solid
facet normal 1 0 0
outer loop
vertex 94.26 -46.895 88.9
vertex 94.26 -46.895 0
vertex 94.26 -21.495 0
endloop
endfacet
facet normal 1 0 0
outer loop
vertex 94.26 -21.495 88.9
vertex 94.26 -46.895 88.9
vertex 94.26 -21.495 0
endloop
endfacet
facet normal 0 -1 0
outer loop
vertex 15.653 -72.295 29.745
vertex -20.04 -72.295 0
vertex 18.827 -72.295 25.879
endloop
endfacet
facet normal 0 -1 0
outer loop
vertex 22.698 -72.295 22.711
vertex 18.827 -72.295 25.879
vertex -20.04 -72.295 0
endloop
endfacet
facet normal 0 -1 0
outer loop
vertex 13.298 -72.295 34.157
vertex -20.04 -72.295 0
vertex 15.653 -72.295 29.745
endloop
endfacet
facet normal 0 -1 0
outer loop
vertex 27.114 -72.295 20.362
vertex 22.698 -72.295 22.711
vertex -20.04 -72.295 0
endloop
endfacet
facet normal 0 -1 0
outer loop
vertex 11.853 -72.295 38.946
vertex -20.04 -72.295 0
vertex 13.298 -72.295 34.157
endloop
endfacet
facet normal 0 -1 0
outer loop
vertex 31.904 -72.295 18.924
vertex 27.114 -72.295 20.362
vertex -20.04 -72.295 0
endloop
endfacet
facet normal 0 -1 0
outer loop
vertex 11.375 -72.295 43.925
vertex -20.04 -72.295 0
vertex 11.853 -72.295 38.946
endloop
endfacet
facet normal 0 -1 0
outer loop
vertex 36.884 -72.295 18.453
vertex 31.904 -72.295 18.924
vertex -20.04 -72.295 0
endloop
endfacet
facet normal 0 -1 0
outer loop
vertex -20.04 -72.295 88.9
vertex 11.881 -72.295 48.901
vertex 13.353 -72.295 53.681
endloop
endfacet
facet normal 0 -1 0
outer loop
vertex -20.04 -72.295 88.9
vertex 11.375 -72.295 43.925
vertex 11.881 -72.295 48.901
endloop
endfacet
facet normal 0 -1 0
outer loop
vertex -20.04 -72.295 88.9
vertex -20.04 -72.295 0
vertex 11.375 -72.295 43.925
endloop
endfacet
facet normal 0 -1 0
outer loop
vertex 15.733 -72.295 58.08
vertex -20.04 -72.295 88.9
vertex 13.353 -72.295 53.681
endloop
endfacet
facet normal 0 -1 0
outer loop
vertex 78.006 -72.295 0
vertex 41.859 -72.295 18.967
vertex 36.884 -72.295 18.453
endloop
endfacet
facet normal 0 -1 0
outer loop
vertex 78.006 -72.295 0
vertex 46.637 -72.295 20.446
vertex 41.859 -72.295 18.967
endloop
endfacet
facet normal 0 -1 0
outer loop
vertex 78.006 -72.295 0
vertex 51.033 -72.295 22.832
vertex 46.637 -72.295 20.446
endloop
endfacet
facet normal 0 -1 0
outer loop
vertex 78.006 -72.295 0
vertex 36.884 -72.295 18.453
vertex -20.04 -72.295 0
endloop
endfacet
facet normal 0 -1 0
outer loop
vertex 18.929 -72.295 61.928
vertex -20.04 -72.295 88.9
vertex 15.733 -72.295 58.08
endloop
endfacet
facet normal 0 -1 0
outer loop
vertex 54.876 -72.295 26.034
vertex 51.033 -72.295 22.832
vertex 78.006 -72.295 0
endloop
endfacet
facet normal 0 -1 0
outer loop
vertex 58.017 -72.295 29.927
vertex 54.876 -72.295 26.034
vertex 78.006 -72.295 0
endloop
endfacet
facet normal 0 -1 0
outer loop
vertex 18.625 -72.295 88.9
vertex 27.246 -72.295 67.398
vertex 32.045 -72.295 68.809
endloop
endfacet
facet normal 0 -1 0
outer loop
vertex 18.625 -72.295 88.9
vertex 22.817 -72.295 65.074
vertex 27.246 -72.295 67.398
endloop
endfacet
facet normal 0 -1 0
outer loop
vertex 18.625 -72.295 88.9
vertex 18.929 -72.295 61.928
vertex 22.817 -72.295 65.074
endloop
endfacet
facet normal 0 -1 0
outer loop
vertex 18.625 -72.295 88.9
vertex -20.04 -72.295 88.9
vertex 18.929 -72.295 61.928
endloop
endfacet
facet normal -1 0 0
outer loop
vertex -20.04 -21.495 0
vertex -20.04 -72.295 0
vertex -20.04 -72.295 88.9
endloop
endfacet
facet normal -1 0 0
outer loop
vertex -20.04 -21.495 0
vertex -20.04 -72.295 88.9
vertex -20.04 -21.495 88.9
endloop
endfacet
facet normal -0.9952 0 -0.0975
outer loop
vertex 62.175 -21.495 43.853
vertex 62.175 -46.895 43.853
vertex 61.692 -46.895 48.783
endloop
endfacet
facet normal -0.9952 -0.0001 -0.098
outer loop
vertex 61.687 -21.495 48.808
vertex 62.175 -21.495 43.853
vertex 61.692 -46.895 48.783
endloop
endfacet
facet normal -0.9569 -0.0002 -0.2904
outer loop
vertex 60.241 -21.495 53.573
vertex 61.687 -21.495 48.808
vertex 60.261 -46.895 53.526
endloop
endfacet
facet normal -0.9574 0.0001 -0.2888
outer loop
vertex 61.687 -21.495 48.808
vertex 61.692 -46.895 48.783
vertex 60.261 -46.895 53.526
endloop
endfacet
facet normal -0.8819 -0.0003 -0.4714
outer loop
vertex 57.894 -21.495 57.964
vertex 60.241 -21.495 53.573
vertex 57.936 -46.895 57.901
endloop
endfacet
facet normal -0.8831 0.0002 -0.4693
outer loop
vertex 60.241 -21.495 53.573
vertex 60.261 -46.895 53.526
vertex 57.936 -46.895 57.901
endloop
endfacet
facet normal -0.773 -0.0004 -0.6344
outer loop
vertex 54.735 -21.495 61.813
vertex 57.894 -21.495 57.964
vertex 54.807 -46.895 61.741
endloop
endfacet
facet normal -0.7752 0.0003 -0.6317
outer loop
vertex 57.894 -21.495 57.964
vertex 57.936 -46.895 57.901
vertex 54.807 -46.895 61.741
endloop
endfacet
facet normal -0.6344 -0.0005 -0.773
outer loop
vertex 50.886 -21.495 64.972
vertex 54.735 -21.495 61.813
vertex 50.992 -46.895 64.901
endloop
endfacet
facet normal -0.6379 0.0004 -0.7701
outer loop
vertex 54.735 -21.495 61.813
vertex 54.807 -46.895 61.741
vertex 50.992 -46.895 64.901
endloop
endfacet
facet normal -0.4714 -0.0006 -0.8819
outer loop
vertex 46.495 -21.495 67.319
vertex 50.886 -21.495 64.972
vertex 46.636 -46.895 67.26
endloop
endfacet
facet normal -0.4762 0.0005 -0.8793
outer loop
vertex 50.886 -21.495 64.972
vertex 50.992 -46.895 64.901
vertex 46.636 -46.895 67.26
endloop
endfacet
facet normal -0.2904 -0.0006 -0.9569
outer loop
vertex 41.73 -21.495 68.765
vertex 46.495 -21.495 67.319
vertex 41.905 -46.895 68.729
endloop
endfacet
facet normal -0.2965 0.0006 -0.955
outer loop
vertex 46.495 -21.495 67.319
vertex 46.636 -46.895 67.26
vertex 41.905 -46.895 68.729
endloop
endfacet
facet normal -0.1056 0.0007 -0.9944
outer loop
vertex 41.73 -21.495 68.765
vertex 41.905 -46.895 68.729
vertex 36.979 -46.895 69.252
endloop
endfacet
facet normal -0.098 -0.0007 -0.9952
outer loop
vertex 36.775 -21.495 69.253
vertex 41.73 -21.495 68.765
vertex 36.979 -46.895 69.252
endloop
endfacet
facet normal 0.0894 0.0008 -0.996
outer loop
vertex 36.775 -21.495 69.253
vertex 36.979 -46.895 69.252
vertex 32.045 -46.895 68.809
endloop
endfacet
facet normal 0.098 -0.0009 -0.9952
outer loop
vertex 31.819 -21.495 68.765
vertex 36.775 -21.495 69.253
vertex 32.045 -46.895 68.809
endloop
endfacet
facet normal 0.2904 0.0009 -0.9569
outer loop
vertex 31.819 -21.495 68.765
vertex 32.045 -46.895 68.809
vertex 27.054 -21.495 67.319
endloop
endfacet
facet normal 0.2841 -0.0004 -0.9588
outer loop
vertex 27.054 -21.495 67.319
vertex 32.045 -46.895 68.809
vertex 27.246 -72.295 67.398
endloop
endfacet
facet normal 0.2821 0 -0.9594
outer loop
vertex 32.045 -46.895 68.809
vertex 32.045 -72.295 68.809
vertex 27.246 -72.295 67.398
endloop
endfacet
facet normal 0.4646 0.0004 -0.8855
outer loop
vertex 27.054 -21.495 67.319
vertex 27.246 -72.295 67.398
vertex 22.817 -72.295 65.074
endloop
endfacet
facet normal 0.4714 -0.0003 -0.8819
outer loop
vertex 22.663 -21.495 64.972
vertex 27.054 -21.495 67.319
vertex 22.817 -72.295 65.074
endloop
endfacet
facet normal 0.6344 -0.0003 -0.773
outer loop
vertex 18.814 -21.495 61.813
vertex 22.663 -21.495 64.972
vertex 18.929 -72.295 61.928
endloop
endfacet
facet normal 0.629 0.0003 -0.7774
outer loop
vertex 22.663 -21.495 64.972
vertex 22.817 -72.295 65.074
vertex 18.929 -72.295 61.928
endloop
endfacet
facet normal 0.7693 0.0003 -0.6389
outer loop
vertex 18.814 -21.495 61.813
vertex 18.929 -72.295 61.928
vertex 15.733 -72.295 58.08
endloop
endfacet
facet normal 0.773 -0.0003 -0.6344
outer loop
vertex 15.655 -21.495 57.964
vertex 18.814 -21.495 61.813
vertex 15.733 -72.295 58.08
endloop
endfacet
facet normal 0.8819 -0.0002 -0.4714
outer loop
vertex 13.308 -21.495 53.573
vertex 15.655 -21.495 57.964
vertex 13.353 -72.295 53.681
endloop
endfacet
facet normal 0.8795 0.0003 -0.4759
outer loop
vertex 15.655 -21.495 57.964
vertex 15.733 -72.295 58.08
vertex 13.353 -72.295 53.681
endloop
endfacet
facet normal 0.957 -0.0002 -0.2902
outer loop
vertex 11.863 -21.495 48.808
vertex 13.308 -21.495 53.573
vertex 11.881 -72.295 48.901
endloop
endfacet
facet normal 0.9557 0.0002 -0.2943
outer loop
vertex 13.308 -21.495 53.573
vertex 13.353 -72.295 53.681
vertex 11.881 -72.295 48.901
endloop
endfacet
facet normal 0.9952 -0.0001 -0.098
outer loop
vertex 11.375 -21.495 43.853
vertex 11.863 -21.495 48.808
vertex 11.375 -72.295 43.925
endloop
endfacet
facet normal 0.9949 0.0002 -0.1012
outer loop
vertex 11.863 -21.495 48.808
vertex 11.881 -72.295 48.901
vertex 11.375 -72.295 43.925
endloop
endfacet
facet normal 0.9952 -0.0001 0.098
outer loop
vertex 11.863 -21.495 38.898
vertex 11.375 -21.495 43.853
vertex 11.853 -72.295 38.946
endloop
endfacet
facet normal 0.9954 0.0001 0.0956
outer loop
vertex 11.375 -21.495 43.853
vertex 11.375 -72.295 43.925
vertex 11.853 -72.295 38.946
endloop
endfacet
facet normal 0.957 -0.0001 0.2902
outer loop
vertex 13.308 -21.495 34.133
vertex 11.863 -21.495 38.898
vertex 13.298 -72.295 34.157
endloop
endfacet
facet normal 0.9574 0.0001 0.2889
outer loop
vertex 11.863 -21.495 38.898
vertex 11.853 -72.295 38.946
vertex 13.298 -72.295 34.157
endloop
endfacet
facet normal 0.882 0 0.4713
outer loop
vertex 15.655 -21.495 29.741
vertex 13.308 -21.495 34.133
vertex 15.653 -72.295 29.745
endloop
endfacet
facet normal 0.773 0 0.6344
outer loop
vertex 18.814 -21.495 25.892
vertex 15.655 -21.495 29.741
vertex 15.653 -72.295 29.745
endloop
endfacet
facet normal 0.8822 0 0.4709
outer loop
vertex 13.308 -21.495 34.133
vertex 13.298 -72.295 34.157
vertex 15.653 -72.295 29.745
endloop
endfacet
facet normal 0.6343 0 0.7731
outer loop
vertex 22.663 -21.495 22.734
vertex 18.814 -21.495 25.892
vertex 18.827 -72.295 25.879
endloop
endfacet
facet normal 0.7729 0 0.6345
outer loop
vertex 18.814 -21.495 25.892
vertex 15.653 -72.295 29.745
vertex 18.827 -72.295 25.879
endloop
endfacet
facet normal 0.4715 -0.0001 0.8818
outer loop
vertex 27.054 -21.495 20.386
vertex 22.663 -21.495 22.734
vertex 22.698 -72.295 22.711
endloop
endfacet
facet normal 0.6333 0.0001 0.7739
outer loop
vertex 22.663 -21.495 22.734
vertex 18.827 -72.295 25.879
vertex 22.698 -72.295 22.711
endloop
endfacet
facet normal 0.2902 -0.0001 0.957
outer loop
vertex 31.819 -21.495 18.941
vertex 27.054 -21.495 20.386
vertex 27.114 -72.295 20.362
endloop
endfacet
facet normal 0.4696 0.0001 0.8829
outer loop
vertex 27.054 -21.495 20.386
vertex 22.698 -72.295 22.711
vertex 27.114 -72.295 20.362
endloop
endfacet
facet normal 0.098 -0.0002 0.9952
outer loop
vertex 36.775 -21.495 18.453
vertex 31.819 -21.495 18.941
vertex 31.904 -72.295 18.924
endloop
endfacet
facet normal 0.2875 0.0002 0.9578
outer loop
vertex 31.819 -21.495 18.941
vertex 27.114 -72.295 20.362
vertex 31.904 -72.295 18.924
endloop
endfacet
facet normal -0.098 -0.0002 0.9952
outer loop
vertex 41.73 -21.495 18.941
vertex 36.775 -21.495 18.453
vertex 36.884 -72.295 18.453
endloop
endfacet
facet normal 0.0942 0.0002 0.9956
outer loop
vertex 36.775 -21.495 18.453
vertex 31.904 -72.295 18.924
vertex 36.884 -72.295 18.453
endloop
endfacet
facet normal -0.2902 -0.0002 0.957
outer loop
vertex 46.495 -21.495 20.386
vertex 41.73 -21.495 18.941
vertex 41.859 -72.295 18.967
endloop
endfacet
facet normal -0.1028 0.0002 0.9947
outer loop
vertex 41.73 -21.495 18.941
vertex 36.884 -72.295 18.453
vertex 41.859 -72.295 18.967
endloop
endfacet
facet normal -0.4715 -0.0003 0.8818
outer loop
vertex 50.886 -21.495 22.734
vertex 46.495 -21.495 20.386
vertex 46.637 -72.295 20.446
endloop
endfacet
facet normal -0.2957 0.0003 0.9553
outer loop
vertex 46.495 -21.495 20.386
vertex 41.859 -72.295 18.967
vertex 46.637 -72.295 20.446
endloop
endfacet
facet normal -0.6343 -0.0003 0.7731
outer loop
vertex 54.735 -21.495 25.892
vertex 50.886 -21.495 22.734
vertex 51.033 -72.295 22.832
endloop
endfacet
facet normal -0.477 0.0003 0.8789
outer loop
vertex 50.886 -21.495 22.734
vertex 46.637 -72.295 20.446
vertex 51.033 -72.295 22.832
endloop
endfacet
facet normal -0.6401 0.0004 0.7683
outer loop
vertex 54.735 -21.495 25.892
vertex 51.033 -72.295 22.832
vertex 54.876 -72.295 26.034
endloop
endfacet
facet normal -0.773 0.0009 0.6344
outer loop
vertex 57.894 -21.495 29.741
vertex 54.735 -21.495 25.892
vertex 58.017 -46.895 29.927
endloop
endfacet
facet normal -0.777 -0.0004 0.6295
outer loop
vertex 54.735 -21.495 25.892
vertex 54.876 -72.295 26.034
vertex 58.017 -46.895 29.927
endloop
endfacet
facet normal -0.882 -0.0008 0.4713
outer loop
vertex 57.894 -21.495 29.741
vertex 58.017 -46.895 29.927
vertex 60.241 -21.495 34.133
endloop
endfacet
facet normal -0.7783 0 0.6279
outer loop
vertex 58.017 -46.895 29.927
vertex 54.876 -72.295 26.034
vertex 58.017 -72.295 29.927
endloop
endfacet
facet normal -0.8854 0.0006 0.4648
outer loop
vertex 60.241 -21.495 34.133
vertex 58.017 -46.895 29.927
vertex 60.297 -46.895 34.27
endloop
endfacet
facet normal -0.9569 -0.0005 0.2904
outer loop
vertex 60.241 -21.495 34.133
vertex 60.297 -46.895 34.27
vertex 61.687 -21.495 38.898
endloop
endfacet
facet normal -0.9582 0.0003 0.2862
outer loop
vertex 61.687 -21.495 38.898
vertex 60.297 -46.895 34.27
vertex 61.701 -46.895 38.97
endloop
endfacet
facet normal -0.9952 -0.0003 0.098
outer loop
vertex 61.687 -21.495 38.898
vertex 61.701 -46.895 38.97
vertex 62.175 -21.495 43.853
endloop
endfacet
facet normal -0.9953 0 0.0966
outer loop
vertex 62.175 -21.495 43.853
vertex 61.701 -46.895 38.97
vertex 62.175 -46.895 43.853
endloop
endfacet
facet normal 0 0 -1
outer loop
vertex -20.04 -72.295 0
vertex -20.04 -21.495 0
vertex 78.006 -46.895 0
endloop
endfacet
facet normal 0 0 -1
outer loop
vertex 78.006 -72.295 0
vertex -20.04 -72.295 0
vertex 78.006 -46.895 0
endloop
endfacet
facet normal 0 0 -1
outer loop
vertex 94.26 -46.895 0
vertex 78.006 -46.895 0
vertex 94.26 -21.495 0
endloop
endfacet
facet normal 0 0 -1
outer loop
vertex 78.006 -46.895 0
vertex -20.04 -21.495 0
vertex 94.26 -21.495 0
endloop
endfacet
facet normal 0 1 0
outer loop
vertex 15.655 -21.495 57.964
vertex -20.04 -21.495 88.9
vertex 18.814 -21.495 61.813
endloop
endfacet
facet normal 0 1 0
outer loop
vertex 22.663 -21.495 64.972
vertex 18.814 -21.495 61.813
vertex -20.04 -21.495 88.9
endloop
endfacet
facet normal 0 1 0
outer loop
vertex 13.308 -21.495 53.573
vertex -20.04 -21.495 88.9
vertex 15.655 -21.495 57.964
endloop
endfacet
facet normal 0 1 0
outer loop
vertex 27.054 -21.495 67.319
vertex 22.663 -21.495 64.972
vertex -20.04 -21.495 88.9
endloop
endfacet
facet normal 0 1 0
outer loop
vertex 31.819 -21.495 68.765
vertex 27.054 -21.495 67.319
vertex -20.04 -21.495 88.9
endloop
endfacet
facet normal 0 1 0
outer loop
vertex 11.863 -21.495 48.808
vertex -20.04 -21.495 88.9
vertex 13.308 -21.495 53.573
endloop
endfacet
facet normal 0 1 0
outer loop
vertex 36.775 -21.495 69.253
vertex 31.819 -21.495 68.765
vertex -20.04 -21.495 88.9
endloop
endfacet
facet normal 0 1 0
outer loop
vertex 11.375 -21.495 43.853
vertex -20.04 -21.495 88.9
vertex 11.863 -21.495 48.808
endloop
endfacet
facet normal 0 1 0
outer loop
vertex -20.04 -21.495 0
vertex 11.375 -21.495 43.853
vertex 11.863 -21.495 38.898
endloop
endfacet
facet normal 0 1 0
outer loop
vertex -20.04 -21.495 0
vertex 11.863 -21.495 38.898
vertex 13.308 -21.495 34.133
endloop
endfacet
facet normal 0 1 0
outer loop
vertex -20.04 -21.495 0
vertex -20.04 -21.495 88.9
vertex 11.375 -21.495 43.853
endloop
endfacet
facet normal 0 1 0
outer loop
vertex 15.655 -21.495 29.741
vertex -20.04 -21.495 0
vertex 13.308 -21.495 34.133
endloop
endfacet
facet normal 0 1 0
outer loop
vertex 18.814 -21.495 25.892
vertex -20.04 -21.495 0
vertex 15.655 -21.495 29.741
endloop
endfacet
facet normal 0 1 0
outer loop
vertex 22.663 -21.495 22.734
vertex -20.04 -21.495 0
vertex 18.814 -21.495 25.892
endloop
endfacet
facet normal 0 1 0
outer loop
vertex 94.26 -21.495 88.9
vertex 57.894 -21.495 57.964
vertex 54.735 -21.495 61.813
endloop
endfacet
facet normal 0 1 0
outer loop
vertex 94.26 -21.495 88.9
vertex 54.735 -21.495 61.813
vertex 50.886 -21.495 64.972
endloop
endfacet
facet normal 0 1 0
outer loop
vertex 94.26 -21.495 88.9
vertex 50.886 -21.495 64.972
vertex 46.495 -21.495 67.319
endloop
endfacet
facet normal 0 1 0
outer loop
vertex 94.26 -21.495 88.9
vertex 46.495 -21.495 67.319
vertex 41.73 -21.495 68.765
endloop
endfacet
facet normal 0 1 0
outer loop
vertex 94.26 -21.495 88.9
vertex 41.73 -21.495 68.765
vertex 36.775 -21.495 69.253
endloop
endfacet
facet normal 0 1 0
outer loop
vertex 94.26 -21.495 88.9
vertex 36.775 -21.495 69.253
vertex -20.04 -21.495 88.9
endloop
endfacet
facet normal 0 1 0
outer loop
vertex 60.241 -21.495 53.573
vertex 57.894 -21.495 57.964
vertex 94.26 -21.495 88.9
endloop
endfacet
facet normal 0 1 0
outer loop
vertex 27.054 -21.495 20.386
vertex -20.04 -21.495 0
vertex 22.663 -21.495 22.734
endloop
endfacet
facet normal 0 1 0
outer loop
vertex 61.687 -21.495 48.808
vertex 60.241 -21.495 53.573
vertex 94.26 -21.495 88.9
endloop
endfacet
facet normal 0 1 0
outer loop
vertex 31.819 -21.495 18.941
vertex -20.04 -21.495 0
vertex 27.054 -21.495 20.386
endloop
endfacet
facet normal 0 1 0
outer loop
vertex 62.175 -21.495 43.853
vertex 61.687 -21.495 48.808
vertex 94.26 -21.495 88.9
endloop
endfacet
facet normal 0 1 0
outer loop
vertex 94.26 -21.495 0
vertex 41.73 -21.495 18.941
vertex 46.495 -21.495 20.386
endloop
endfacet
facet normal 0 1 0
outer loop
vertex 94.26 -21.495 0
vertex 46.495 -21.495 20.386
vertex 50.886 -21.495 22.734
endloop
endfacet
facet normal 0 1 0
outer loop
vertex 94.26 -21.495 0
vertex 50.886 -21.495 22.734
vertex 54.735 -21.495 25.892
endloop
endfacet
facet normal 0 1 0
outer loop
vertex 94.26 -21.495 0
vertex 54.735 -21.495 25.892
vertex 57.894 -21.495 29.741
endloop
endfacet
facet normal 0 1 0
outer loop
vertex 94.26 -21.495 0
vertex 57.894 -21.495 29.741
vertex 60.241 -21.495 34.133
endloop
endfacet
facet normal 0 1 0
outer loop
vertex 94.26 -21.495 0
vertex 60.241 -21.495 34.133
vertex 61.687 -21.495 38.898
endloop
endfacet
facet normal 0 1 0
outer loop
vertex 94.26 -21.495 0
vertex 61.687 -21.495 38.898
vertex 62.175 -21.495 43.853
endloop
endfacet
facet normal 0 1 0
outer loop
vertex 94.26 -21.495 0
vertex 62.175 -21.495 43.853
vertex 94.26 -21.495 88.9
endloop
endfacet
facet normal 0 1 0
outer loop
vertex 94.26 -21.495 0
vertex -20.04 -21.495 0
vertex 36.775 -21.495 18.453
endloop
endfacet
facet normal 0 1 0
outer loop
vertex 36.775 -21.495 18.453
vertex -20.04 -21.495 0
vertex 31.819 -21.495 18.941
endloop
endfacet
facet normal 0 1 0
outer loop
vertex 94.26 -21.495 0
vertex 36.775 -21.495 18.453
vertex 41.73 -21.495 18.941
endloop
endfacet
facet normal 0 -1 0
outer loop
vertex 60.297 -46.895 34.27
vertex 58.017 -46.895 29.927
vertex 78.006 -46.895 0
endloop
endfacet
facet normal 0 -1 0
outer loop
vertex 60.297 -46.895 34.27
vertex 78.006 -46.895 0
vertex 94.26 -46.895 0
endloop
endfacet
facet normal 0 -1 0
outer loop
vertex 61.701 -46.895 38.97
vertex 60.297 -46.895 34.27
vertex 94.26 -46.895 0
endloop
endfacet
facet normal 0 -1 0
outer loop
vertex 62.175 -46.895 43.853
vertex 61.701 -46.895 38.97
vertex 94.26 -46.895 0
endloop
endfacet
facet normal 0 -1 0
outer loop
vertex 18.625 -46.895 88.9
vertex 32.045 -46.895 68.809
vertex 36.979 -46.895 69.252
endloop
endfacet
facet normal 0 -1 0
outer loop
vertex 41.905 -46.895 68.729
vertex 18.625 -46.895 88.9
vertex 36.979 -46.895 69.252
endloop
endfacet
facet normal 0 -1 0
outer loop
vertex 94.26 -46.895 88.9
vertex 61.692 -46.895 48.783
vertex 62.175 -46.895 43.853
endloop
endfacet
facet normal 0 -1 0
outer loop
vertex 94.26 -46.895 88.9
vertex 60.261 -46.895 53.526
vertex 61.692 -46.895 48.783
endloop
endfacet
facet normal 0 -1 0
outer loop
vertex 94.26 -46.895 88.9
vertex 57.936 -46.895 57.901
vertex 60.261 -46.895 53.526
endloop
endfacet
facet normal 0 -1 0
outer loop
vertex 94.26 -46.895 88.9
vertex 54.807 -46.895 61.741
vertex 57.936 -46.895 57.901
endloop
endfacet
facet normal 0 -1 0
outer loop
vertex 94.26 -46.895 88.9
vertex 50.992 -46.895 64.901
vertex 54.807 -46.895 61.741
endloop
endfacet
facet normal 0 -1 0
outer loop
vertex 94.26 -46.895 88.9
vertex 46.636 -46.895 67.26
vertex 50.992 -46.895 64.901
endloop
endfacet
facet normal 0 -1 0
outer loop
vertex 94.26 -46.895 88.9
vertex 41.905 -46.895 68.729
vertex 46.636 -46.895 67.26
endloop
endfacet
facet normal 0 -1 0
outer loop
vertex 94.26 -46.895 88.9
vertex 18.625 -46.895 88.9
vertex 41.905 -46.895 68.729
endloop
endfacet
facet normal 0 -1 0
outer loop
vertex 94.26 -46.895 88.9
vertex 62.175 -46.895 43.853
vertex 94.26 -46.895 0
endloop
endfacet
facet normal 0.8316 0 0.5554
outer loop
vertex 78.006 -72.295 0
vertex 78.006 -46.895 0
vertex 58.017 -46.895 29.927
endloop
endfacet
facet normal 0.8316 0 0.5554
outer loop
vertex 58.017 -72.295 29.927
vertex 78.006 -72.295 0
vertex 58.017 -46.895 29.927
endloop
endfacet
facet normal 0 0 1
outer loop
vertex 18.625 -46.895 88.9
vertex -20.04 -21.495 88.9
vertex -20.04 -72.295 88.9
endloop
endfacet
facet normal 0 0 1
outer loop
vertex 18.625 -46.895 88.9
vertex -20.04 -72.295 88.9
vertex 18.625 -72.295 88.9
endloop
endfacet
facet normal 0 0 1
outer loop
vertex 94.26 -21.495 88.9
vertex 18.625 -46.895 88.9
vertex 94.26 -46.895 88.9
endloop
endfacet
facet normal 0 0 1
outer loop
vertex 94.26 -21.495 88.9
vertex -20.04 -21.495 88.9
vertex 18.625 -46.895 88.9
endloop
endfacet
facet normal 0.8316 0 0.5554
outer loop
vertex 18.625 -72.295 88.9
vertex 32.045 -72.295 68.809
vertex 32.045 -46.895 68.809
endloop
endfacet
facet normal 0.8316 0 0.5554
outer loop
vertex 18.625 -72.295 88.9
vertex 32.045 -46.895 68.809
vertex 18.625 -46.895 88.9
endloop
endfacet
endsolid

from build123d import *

# Parameters (mm, degrees)
F0_W     = 114.3
F0_H     = 50.8
F1_DEPTH = 88.9
F3_DEPTH = 25.4
F5_DEPTH = 25.4
F6_R     = 25.4
F7_DEPTH = 92.202


with BuildPart() as f1:
    # F0 (on Top) → F1 (new body)
    with BuildSketch(Plane.XY):
        with Locations((37.11038, -46.895293)):
            Rectangle(F0_W, F0_H)
    extrude(amount=F1_DEPTH)

    # F2 (on face) → F3 (cut)
    with BuildSketch(Plane.XZ.offset(72.295293)):
        Polygon((68.86038, 0), (94.26038, 0), (94.26038, 88.9), (18.62484, 88.9), align=None)
        Polygon((18.62484, 0), (68.86038, 0), (18.62484, 88.9), align=None)
    extrude(amount=-F3_DEPTH, mode=Mode.SUBTRACT)

    # F4 (on face) → F5 (join)
    with BuildSketch(Plane.XZ.offset(46.895293)):
        Polygon((78.006379, 0), (18.62484, 88.9), (18.62484, 0), align=None)
    extrude(amount=F5_DEPTH)

    # F6 (on face) → F7 (cut)
    with BuildSketch(Plane.XZ.offset(72.295293)):
        with Locations((36.774643, 43.852847)):
            Circle(F6_R)
    extrude(amount=-F7_DEPTH, mode=Mode.SUBTRACT)


solid = f1.part
